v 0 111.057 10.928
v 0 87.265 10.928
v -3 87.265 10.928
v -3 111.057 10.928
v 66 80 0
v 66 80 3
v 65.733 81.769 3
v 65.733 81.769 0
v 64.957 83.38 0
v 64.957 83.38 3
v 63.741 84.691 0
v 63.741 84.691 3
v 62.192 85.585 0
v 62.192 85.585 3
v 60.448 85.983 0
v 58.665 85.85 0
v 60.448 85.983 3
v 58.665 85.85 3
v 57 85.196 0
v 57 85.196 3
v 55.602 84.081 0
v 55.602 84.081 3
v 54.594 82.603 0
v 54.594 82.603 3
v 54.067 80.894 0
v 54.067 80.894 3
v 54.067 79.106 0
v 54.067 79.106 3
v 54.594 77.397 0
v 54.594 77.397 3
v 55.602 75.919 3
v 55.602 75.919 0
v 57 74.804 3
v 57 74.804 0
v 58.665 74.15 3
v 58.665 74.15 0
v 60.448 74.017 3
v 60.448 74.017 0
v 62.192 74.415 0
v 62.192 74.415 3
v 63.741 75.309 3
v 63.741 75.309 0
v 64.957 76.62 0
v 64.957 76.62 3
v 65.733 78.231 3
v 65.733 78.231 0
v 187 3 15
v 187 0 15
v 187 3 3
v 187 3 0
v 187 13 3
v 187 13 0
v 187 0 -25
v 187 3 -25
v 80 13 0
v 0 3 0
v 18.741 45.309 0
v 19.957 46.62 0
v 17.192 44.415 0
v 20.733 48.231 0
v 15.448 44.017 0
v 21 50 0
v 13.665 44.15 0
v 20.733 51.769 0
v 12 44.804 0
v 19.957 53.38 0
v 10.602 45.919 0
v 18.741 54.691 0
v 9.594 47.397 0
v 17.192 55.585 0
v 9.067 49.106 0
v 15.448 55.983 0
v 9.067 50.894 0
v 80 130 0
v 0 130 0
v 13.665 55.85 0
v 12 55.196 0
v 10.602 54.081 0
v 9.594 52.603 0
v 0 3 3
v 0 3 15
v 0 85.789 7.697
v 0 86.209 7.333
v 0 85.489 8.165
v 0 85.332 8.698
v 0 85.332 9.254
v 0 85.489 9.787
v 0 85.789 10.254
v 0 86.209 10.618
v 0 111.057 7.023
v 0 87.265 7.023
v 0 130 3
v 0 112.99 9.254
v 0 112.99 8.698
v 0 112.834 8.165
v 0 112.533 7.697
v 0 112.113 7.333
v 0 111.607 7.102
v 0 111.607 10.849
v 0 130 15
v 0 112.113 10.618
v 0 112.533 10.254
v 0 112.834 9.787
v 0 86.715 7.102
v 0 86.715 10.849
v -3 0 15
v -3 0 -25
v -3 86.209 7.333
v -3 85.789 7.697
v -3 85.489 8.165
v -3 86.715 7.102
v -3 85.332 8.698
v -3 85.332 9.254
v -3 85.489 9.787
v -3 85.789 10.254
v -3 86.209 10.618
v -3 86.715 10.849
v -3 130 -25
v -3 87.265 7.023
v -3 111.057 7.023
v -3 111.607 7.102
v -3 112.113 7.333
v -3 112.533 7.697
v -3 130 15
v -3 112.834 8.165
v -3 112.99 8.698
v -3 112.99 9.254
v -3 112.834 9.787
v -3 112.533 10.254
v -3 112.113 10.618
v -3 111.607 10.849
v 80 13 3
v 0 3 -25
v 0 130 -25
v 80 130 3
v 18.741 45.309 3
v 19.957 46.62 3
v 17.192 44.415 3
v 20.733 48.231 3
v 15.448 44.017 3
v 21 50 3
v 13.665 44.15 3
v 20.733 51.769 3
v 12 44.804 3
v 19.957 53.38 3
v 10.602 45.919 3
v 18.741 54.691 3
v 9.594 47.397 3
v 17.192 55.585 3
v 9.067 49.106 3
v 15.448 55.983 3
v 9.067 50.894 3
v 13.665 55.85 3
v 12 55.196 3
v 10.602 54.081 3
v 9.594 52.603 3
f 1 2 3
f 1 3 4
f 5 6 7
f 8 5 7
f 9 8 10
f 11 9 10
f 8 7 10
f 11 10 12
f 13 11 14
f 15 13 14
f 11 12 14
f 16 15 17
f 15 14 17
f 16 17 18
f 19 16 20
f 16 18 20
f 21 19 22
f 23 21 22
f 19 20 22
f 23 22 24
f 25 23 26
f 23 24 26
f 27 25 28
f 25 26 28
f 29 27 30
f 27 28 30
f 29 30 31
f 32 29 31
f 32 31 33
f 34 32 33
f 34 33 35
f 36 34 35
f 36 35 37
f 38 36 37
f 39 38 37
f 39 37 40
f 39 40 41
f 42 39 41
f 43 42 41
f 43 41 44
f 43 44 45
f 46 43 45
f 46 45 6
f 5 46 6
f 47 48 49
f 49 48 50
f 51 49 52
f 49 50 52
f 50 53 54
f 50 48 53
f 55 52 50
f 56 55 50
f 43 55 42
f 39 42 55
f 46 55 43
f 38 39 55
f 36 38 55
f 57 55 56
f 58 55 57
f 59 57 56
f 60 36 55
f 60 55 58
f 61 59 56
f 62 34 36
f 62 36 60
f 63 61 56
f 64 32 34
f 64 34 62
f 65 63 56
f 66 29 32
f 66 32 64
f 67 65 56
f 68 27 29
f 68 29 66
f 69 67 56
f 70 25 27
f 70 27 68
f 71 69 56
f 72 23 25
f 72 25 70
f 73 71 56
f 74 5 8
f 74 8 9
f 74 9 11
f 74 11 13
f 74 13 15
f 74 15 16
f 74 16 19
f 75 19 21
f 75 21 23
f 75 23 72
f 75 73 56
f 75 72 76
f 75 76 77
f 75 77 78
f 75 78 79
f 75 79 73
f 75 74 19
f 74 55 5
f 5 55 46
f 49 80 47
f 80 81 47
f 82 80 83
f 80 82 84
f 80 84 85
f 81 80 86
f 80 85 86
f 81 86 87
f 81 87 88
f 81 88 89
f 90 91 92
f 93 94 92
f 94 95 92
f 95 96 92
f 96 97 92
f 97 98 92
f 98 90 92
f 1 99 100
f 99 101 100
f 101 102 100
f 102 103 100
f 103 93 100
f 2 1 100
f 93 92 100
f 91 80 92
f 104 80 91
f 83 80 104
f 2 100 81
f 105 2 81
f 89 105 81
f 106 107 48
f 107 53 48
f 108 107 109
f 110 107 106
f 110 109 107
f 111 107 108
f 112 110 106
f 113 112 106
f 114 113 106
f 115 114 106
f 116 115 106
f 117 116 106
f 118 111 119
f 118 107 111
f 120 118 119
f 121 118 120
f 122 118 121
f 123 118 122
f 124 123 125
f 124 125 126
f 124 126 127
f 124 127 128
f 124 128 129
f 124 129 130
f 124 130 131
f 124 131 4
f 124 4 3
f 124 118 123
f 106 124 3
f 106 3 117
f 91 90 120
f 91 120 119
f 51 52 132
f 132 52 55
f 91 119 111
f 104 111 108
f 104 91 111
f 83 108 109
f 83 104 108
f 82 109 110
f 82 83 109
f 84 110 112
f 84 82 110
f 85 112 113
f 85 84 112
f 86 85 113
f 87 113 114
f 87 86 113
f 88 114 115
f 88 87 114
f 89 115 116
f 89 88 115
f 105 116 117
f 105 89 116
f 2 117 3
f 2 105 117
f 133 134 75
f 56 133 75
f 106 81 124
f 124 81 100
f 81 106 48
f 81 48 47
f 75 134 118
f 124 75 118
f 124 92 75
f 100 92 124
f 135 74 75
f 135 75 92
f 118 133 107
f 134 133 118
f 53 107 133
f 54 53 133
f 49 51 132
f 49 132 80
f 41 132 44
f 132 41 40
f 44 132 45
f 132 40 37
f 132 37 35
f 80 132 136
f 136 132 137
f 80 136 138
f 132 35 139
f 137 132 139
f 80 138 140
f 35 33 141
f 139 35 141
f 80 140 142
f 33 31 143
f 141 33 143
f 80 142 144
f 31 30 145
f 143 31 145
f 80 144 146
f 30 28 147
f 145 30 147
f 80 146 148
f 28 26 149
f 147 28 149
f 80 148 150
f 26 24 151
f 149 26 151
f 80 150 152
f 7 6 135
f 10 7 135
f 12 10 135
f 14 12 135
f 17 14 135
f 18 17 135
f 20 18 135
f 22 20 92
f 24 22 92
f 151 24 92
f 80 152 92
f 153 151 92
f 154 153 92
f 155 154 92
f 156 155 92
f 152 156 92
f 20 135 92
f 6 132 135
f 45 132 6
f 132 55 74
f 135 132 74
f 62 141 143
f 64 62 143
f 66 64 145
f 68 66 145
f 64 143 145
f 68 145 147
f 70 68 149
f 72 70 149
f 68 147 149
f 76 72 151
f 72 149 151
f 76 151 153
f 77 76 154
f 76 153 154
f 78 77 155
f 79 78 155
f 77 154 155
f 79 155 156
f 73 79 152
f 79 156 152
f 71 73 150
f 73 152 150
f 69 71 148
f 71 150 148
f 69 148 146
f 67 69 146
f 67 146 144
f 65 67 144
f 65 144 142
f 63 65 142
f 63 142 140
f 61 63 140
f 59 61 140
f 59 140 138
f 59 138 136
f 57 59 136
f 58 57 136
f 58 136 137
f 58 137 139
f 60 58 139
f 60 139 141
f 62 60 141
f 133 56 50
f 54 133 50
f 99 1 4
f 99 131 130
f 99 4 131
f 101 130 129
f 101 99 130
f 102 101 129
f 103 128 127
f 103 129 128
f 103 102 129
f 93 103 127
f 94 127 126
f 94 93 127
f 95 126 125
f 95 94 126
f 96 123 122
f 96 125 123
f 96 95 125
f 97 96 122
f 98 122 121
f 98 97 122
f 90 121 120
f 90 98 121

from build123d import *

# Parameters (mm, degrees)
SKETCH1_W           = 80
SKETCH1_H           = 130
BOSS_EXTRUDE1_DEPTH = 3
SKETCH2_R           = 6
CUT_EXTRUDE1_DEPTH  = 153.672852859
SKETCH3_W           = 40
SKETCH3_H           = 130
BOSS_EXTRUDE2_DEPTH = 3
SKETCH4_W           = 190
SKETCH4_H           = 40
BOSS_EXTRUDE3_DEPTH = 3
SKETCH5_W           = 107
SKETCH5_H           = 10
BOSS_EXTRUDE4_DEPTH = 3
CUT_EXTRUDE2_DEPTH  = 230.1156913


with BuildPart() as part:
    # Sketch1 → Boss-Extrude1 (new body)
    with BuildSketch(Plane.XY):
        with Locations((40, 65)):
            Rectangle(SKETCH1_W, SKETCH1_H)
    extrude(amount=BOSS_EXTRUDE1_DEPTH)

    # Sketch2 → Cut-Extrude1 (cut, through all)
    with BuildSketch(Plane.XY.offset(3)):
        with Locations((60, 80)):
            Circle(SKETCH2_R)
        with Locations((15, 50)):
            Circle(SKETCH2_R)
    extrude(amount=-CUT_EXTRUDE1_DEPTH, mode=Mode.SUBTRACT)

    # Sketch3 → Boss-Extrude2 (add)
    with BuildSketch(Plane.ZY):
        with Locations((-5, 65)):
            Rectangle(SKETCH3_W, SKETCH3_H)
    extrude(amount=BOSS_EXTRUDE2_DEPTH)

    # Sketch4 → Boss-Extrude3 (add)
    with BuildSketch(Plane.XZ):
        with Locations((92, -5)):
            Rectangle(SKETCH4_W, SKETCH4_H)
    extrude(amount=-BOSS_EXTRUDE3_DEPTH)

    # Sketch5 → Boss-Extrude4 (add)
    with BuildSketch(Plane(origin=(0, 0, 0), x_dir=(-1, 0, 0), z_dir=(0, 0, -1))):
        with Locations((-133.5, 8)):
            Rectangle(SKETCH5_W, SKETCH5_H)
    extrude(amount=-BOSS_EXTRUDE4_DEPTH)

    # Sketch6 → Cut-Extrude2 (cut, through all)
    with BuildSketch(Plane(origin=(0, 0, 0), x_dir=(0, 0, -1), z_dir=(1, 0, 0))):
        with BuildLine():
            Line((-7.023016919, 111.057268812), (-7.023016919, 87.264774426))
            ThreePointArc((-7.023016919, 87.264774426), (-8.975714476, 85.312076869), (-10.928412033, 87.264774426))
            Line((-10.928412033, 87.264774426), (-10.928412033, 111.057268812))
            ThreePointArc((-10.928412033, 111.057268812), (-8.975714476, 113.00996637), (-7.023016919, 111.057268812))
        make_face()
    extrude(amount=-CUT_EXTRUDE2_DEPTH, mode=Mode.SUBTRACT)


solid = part.part
